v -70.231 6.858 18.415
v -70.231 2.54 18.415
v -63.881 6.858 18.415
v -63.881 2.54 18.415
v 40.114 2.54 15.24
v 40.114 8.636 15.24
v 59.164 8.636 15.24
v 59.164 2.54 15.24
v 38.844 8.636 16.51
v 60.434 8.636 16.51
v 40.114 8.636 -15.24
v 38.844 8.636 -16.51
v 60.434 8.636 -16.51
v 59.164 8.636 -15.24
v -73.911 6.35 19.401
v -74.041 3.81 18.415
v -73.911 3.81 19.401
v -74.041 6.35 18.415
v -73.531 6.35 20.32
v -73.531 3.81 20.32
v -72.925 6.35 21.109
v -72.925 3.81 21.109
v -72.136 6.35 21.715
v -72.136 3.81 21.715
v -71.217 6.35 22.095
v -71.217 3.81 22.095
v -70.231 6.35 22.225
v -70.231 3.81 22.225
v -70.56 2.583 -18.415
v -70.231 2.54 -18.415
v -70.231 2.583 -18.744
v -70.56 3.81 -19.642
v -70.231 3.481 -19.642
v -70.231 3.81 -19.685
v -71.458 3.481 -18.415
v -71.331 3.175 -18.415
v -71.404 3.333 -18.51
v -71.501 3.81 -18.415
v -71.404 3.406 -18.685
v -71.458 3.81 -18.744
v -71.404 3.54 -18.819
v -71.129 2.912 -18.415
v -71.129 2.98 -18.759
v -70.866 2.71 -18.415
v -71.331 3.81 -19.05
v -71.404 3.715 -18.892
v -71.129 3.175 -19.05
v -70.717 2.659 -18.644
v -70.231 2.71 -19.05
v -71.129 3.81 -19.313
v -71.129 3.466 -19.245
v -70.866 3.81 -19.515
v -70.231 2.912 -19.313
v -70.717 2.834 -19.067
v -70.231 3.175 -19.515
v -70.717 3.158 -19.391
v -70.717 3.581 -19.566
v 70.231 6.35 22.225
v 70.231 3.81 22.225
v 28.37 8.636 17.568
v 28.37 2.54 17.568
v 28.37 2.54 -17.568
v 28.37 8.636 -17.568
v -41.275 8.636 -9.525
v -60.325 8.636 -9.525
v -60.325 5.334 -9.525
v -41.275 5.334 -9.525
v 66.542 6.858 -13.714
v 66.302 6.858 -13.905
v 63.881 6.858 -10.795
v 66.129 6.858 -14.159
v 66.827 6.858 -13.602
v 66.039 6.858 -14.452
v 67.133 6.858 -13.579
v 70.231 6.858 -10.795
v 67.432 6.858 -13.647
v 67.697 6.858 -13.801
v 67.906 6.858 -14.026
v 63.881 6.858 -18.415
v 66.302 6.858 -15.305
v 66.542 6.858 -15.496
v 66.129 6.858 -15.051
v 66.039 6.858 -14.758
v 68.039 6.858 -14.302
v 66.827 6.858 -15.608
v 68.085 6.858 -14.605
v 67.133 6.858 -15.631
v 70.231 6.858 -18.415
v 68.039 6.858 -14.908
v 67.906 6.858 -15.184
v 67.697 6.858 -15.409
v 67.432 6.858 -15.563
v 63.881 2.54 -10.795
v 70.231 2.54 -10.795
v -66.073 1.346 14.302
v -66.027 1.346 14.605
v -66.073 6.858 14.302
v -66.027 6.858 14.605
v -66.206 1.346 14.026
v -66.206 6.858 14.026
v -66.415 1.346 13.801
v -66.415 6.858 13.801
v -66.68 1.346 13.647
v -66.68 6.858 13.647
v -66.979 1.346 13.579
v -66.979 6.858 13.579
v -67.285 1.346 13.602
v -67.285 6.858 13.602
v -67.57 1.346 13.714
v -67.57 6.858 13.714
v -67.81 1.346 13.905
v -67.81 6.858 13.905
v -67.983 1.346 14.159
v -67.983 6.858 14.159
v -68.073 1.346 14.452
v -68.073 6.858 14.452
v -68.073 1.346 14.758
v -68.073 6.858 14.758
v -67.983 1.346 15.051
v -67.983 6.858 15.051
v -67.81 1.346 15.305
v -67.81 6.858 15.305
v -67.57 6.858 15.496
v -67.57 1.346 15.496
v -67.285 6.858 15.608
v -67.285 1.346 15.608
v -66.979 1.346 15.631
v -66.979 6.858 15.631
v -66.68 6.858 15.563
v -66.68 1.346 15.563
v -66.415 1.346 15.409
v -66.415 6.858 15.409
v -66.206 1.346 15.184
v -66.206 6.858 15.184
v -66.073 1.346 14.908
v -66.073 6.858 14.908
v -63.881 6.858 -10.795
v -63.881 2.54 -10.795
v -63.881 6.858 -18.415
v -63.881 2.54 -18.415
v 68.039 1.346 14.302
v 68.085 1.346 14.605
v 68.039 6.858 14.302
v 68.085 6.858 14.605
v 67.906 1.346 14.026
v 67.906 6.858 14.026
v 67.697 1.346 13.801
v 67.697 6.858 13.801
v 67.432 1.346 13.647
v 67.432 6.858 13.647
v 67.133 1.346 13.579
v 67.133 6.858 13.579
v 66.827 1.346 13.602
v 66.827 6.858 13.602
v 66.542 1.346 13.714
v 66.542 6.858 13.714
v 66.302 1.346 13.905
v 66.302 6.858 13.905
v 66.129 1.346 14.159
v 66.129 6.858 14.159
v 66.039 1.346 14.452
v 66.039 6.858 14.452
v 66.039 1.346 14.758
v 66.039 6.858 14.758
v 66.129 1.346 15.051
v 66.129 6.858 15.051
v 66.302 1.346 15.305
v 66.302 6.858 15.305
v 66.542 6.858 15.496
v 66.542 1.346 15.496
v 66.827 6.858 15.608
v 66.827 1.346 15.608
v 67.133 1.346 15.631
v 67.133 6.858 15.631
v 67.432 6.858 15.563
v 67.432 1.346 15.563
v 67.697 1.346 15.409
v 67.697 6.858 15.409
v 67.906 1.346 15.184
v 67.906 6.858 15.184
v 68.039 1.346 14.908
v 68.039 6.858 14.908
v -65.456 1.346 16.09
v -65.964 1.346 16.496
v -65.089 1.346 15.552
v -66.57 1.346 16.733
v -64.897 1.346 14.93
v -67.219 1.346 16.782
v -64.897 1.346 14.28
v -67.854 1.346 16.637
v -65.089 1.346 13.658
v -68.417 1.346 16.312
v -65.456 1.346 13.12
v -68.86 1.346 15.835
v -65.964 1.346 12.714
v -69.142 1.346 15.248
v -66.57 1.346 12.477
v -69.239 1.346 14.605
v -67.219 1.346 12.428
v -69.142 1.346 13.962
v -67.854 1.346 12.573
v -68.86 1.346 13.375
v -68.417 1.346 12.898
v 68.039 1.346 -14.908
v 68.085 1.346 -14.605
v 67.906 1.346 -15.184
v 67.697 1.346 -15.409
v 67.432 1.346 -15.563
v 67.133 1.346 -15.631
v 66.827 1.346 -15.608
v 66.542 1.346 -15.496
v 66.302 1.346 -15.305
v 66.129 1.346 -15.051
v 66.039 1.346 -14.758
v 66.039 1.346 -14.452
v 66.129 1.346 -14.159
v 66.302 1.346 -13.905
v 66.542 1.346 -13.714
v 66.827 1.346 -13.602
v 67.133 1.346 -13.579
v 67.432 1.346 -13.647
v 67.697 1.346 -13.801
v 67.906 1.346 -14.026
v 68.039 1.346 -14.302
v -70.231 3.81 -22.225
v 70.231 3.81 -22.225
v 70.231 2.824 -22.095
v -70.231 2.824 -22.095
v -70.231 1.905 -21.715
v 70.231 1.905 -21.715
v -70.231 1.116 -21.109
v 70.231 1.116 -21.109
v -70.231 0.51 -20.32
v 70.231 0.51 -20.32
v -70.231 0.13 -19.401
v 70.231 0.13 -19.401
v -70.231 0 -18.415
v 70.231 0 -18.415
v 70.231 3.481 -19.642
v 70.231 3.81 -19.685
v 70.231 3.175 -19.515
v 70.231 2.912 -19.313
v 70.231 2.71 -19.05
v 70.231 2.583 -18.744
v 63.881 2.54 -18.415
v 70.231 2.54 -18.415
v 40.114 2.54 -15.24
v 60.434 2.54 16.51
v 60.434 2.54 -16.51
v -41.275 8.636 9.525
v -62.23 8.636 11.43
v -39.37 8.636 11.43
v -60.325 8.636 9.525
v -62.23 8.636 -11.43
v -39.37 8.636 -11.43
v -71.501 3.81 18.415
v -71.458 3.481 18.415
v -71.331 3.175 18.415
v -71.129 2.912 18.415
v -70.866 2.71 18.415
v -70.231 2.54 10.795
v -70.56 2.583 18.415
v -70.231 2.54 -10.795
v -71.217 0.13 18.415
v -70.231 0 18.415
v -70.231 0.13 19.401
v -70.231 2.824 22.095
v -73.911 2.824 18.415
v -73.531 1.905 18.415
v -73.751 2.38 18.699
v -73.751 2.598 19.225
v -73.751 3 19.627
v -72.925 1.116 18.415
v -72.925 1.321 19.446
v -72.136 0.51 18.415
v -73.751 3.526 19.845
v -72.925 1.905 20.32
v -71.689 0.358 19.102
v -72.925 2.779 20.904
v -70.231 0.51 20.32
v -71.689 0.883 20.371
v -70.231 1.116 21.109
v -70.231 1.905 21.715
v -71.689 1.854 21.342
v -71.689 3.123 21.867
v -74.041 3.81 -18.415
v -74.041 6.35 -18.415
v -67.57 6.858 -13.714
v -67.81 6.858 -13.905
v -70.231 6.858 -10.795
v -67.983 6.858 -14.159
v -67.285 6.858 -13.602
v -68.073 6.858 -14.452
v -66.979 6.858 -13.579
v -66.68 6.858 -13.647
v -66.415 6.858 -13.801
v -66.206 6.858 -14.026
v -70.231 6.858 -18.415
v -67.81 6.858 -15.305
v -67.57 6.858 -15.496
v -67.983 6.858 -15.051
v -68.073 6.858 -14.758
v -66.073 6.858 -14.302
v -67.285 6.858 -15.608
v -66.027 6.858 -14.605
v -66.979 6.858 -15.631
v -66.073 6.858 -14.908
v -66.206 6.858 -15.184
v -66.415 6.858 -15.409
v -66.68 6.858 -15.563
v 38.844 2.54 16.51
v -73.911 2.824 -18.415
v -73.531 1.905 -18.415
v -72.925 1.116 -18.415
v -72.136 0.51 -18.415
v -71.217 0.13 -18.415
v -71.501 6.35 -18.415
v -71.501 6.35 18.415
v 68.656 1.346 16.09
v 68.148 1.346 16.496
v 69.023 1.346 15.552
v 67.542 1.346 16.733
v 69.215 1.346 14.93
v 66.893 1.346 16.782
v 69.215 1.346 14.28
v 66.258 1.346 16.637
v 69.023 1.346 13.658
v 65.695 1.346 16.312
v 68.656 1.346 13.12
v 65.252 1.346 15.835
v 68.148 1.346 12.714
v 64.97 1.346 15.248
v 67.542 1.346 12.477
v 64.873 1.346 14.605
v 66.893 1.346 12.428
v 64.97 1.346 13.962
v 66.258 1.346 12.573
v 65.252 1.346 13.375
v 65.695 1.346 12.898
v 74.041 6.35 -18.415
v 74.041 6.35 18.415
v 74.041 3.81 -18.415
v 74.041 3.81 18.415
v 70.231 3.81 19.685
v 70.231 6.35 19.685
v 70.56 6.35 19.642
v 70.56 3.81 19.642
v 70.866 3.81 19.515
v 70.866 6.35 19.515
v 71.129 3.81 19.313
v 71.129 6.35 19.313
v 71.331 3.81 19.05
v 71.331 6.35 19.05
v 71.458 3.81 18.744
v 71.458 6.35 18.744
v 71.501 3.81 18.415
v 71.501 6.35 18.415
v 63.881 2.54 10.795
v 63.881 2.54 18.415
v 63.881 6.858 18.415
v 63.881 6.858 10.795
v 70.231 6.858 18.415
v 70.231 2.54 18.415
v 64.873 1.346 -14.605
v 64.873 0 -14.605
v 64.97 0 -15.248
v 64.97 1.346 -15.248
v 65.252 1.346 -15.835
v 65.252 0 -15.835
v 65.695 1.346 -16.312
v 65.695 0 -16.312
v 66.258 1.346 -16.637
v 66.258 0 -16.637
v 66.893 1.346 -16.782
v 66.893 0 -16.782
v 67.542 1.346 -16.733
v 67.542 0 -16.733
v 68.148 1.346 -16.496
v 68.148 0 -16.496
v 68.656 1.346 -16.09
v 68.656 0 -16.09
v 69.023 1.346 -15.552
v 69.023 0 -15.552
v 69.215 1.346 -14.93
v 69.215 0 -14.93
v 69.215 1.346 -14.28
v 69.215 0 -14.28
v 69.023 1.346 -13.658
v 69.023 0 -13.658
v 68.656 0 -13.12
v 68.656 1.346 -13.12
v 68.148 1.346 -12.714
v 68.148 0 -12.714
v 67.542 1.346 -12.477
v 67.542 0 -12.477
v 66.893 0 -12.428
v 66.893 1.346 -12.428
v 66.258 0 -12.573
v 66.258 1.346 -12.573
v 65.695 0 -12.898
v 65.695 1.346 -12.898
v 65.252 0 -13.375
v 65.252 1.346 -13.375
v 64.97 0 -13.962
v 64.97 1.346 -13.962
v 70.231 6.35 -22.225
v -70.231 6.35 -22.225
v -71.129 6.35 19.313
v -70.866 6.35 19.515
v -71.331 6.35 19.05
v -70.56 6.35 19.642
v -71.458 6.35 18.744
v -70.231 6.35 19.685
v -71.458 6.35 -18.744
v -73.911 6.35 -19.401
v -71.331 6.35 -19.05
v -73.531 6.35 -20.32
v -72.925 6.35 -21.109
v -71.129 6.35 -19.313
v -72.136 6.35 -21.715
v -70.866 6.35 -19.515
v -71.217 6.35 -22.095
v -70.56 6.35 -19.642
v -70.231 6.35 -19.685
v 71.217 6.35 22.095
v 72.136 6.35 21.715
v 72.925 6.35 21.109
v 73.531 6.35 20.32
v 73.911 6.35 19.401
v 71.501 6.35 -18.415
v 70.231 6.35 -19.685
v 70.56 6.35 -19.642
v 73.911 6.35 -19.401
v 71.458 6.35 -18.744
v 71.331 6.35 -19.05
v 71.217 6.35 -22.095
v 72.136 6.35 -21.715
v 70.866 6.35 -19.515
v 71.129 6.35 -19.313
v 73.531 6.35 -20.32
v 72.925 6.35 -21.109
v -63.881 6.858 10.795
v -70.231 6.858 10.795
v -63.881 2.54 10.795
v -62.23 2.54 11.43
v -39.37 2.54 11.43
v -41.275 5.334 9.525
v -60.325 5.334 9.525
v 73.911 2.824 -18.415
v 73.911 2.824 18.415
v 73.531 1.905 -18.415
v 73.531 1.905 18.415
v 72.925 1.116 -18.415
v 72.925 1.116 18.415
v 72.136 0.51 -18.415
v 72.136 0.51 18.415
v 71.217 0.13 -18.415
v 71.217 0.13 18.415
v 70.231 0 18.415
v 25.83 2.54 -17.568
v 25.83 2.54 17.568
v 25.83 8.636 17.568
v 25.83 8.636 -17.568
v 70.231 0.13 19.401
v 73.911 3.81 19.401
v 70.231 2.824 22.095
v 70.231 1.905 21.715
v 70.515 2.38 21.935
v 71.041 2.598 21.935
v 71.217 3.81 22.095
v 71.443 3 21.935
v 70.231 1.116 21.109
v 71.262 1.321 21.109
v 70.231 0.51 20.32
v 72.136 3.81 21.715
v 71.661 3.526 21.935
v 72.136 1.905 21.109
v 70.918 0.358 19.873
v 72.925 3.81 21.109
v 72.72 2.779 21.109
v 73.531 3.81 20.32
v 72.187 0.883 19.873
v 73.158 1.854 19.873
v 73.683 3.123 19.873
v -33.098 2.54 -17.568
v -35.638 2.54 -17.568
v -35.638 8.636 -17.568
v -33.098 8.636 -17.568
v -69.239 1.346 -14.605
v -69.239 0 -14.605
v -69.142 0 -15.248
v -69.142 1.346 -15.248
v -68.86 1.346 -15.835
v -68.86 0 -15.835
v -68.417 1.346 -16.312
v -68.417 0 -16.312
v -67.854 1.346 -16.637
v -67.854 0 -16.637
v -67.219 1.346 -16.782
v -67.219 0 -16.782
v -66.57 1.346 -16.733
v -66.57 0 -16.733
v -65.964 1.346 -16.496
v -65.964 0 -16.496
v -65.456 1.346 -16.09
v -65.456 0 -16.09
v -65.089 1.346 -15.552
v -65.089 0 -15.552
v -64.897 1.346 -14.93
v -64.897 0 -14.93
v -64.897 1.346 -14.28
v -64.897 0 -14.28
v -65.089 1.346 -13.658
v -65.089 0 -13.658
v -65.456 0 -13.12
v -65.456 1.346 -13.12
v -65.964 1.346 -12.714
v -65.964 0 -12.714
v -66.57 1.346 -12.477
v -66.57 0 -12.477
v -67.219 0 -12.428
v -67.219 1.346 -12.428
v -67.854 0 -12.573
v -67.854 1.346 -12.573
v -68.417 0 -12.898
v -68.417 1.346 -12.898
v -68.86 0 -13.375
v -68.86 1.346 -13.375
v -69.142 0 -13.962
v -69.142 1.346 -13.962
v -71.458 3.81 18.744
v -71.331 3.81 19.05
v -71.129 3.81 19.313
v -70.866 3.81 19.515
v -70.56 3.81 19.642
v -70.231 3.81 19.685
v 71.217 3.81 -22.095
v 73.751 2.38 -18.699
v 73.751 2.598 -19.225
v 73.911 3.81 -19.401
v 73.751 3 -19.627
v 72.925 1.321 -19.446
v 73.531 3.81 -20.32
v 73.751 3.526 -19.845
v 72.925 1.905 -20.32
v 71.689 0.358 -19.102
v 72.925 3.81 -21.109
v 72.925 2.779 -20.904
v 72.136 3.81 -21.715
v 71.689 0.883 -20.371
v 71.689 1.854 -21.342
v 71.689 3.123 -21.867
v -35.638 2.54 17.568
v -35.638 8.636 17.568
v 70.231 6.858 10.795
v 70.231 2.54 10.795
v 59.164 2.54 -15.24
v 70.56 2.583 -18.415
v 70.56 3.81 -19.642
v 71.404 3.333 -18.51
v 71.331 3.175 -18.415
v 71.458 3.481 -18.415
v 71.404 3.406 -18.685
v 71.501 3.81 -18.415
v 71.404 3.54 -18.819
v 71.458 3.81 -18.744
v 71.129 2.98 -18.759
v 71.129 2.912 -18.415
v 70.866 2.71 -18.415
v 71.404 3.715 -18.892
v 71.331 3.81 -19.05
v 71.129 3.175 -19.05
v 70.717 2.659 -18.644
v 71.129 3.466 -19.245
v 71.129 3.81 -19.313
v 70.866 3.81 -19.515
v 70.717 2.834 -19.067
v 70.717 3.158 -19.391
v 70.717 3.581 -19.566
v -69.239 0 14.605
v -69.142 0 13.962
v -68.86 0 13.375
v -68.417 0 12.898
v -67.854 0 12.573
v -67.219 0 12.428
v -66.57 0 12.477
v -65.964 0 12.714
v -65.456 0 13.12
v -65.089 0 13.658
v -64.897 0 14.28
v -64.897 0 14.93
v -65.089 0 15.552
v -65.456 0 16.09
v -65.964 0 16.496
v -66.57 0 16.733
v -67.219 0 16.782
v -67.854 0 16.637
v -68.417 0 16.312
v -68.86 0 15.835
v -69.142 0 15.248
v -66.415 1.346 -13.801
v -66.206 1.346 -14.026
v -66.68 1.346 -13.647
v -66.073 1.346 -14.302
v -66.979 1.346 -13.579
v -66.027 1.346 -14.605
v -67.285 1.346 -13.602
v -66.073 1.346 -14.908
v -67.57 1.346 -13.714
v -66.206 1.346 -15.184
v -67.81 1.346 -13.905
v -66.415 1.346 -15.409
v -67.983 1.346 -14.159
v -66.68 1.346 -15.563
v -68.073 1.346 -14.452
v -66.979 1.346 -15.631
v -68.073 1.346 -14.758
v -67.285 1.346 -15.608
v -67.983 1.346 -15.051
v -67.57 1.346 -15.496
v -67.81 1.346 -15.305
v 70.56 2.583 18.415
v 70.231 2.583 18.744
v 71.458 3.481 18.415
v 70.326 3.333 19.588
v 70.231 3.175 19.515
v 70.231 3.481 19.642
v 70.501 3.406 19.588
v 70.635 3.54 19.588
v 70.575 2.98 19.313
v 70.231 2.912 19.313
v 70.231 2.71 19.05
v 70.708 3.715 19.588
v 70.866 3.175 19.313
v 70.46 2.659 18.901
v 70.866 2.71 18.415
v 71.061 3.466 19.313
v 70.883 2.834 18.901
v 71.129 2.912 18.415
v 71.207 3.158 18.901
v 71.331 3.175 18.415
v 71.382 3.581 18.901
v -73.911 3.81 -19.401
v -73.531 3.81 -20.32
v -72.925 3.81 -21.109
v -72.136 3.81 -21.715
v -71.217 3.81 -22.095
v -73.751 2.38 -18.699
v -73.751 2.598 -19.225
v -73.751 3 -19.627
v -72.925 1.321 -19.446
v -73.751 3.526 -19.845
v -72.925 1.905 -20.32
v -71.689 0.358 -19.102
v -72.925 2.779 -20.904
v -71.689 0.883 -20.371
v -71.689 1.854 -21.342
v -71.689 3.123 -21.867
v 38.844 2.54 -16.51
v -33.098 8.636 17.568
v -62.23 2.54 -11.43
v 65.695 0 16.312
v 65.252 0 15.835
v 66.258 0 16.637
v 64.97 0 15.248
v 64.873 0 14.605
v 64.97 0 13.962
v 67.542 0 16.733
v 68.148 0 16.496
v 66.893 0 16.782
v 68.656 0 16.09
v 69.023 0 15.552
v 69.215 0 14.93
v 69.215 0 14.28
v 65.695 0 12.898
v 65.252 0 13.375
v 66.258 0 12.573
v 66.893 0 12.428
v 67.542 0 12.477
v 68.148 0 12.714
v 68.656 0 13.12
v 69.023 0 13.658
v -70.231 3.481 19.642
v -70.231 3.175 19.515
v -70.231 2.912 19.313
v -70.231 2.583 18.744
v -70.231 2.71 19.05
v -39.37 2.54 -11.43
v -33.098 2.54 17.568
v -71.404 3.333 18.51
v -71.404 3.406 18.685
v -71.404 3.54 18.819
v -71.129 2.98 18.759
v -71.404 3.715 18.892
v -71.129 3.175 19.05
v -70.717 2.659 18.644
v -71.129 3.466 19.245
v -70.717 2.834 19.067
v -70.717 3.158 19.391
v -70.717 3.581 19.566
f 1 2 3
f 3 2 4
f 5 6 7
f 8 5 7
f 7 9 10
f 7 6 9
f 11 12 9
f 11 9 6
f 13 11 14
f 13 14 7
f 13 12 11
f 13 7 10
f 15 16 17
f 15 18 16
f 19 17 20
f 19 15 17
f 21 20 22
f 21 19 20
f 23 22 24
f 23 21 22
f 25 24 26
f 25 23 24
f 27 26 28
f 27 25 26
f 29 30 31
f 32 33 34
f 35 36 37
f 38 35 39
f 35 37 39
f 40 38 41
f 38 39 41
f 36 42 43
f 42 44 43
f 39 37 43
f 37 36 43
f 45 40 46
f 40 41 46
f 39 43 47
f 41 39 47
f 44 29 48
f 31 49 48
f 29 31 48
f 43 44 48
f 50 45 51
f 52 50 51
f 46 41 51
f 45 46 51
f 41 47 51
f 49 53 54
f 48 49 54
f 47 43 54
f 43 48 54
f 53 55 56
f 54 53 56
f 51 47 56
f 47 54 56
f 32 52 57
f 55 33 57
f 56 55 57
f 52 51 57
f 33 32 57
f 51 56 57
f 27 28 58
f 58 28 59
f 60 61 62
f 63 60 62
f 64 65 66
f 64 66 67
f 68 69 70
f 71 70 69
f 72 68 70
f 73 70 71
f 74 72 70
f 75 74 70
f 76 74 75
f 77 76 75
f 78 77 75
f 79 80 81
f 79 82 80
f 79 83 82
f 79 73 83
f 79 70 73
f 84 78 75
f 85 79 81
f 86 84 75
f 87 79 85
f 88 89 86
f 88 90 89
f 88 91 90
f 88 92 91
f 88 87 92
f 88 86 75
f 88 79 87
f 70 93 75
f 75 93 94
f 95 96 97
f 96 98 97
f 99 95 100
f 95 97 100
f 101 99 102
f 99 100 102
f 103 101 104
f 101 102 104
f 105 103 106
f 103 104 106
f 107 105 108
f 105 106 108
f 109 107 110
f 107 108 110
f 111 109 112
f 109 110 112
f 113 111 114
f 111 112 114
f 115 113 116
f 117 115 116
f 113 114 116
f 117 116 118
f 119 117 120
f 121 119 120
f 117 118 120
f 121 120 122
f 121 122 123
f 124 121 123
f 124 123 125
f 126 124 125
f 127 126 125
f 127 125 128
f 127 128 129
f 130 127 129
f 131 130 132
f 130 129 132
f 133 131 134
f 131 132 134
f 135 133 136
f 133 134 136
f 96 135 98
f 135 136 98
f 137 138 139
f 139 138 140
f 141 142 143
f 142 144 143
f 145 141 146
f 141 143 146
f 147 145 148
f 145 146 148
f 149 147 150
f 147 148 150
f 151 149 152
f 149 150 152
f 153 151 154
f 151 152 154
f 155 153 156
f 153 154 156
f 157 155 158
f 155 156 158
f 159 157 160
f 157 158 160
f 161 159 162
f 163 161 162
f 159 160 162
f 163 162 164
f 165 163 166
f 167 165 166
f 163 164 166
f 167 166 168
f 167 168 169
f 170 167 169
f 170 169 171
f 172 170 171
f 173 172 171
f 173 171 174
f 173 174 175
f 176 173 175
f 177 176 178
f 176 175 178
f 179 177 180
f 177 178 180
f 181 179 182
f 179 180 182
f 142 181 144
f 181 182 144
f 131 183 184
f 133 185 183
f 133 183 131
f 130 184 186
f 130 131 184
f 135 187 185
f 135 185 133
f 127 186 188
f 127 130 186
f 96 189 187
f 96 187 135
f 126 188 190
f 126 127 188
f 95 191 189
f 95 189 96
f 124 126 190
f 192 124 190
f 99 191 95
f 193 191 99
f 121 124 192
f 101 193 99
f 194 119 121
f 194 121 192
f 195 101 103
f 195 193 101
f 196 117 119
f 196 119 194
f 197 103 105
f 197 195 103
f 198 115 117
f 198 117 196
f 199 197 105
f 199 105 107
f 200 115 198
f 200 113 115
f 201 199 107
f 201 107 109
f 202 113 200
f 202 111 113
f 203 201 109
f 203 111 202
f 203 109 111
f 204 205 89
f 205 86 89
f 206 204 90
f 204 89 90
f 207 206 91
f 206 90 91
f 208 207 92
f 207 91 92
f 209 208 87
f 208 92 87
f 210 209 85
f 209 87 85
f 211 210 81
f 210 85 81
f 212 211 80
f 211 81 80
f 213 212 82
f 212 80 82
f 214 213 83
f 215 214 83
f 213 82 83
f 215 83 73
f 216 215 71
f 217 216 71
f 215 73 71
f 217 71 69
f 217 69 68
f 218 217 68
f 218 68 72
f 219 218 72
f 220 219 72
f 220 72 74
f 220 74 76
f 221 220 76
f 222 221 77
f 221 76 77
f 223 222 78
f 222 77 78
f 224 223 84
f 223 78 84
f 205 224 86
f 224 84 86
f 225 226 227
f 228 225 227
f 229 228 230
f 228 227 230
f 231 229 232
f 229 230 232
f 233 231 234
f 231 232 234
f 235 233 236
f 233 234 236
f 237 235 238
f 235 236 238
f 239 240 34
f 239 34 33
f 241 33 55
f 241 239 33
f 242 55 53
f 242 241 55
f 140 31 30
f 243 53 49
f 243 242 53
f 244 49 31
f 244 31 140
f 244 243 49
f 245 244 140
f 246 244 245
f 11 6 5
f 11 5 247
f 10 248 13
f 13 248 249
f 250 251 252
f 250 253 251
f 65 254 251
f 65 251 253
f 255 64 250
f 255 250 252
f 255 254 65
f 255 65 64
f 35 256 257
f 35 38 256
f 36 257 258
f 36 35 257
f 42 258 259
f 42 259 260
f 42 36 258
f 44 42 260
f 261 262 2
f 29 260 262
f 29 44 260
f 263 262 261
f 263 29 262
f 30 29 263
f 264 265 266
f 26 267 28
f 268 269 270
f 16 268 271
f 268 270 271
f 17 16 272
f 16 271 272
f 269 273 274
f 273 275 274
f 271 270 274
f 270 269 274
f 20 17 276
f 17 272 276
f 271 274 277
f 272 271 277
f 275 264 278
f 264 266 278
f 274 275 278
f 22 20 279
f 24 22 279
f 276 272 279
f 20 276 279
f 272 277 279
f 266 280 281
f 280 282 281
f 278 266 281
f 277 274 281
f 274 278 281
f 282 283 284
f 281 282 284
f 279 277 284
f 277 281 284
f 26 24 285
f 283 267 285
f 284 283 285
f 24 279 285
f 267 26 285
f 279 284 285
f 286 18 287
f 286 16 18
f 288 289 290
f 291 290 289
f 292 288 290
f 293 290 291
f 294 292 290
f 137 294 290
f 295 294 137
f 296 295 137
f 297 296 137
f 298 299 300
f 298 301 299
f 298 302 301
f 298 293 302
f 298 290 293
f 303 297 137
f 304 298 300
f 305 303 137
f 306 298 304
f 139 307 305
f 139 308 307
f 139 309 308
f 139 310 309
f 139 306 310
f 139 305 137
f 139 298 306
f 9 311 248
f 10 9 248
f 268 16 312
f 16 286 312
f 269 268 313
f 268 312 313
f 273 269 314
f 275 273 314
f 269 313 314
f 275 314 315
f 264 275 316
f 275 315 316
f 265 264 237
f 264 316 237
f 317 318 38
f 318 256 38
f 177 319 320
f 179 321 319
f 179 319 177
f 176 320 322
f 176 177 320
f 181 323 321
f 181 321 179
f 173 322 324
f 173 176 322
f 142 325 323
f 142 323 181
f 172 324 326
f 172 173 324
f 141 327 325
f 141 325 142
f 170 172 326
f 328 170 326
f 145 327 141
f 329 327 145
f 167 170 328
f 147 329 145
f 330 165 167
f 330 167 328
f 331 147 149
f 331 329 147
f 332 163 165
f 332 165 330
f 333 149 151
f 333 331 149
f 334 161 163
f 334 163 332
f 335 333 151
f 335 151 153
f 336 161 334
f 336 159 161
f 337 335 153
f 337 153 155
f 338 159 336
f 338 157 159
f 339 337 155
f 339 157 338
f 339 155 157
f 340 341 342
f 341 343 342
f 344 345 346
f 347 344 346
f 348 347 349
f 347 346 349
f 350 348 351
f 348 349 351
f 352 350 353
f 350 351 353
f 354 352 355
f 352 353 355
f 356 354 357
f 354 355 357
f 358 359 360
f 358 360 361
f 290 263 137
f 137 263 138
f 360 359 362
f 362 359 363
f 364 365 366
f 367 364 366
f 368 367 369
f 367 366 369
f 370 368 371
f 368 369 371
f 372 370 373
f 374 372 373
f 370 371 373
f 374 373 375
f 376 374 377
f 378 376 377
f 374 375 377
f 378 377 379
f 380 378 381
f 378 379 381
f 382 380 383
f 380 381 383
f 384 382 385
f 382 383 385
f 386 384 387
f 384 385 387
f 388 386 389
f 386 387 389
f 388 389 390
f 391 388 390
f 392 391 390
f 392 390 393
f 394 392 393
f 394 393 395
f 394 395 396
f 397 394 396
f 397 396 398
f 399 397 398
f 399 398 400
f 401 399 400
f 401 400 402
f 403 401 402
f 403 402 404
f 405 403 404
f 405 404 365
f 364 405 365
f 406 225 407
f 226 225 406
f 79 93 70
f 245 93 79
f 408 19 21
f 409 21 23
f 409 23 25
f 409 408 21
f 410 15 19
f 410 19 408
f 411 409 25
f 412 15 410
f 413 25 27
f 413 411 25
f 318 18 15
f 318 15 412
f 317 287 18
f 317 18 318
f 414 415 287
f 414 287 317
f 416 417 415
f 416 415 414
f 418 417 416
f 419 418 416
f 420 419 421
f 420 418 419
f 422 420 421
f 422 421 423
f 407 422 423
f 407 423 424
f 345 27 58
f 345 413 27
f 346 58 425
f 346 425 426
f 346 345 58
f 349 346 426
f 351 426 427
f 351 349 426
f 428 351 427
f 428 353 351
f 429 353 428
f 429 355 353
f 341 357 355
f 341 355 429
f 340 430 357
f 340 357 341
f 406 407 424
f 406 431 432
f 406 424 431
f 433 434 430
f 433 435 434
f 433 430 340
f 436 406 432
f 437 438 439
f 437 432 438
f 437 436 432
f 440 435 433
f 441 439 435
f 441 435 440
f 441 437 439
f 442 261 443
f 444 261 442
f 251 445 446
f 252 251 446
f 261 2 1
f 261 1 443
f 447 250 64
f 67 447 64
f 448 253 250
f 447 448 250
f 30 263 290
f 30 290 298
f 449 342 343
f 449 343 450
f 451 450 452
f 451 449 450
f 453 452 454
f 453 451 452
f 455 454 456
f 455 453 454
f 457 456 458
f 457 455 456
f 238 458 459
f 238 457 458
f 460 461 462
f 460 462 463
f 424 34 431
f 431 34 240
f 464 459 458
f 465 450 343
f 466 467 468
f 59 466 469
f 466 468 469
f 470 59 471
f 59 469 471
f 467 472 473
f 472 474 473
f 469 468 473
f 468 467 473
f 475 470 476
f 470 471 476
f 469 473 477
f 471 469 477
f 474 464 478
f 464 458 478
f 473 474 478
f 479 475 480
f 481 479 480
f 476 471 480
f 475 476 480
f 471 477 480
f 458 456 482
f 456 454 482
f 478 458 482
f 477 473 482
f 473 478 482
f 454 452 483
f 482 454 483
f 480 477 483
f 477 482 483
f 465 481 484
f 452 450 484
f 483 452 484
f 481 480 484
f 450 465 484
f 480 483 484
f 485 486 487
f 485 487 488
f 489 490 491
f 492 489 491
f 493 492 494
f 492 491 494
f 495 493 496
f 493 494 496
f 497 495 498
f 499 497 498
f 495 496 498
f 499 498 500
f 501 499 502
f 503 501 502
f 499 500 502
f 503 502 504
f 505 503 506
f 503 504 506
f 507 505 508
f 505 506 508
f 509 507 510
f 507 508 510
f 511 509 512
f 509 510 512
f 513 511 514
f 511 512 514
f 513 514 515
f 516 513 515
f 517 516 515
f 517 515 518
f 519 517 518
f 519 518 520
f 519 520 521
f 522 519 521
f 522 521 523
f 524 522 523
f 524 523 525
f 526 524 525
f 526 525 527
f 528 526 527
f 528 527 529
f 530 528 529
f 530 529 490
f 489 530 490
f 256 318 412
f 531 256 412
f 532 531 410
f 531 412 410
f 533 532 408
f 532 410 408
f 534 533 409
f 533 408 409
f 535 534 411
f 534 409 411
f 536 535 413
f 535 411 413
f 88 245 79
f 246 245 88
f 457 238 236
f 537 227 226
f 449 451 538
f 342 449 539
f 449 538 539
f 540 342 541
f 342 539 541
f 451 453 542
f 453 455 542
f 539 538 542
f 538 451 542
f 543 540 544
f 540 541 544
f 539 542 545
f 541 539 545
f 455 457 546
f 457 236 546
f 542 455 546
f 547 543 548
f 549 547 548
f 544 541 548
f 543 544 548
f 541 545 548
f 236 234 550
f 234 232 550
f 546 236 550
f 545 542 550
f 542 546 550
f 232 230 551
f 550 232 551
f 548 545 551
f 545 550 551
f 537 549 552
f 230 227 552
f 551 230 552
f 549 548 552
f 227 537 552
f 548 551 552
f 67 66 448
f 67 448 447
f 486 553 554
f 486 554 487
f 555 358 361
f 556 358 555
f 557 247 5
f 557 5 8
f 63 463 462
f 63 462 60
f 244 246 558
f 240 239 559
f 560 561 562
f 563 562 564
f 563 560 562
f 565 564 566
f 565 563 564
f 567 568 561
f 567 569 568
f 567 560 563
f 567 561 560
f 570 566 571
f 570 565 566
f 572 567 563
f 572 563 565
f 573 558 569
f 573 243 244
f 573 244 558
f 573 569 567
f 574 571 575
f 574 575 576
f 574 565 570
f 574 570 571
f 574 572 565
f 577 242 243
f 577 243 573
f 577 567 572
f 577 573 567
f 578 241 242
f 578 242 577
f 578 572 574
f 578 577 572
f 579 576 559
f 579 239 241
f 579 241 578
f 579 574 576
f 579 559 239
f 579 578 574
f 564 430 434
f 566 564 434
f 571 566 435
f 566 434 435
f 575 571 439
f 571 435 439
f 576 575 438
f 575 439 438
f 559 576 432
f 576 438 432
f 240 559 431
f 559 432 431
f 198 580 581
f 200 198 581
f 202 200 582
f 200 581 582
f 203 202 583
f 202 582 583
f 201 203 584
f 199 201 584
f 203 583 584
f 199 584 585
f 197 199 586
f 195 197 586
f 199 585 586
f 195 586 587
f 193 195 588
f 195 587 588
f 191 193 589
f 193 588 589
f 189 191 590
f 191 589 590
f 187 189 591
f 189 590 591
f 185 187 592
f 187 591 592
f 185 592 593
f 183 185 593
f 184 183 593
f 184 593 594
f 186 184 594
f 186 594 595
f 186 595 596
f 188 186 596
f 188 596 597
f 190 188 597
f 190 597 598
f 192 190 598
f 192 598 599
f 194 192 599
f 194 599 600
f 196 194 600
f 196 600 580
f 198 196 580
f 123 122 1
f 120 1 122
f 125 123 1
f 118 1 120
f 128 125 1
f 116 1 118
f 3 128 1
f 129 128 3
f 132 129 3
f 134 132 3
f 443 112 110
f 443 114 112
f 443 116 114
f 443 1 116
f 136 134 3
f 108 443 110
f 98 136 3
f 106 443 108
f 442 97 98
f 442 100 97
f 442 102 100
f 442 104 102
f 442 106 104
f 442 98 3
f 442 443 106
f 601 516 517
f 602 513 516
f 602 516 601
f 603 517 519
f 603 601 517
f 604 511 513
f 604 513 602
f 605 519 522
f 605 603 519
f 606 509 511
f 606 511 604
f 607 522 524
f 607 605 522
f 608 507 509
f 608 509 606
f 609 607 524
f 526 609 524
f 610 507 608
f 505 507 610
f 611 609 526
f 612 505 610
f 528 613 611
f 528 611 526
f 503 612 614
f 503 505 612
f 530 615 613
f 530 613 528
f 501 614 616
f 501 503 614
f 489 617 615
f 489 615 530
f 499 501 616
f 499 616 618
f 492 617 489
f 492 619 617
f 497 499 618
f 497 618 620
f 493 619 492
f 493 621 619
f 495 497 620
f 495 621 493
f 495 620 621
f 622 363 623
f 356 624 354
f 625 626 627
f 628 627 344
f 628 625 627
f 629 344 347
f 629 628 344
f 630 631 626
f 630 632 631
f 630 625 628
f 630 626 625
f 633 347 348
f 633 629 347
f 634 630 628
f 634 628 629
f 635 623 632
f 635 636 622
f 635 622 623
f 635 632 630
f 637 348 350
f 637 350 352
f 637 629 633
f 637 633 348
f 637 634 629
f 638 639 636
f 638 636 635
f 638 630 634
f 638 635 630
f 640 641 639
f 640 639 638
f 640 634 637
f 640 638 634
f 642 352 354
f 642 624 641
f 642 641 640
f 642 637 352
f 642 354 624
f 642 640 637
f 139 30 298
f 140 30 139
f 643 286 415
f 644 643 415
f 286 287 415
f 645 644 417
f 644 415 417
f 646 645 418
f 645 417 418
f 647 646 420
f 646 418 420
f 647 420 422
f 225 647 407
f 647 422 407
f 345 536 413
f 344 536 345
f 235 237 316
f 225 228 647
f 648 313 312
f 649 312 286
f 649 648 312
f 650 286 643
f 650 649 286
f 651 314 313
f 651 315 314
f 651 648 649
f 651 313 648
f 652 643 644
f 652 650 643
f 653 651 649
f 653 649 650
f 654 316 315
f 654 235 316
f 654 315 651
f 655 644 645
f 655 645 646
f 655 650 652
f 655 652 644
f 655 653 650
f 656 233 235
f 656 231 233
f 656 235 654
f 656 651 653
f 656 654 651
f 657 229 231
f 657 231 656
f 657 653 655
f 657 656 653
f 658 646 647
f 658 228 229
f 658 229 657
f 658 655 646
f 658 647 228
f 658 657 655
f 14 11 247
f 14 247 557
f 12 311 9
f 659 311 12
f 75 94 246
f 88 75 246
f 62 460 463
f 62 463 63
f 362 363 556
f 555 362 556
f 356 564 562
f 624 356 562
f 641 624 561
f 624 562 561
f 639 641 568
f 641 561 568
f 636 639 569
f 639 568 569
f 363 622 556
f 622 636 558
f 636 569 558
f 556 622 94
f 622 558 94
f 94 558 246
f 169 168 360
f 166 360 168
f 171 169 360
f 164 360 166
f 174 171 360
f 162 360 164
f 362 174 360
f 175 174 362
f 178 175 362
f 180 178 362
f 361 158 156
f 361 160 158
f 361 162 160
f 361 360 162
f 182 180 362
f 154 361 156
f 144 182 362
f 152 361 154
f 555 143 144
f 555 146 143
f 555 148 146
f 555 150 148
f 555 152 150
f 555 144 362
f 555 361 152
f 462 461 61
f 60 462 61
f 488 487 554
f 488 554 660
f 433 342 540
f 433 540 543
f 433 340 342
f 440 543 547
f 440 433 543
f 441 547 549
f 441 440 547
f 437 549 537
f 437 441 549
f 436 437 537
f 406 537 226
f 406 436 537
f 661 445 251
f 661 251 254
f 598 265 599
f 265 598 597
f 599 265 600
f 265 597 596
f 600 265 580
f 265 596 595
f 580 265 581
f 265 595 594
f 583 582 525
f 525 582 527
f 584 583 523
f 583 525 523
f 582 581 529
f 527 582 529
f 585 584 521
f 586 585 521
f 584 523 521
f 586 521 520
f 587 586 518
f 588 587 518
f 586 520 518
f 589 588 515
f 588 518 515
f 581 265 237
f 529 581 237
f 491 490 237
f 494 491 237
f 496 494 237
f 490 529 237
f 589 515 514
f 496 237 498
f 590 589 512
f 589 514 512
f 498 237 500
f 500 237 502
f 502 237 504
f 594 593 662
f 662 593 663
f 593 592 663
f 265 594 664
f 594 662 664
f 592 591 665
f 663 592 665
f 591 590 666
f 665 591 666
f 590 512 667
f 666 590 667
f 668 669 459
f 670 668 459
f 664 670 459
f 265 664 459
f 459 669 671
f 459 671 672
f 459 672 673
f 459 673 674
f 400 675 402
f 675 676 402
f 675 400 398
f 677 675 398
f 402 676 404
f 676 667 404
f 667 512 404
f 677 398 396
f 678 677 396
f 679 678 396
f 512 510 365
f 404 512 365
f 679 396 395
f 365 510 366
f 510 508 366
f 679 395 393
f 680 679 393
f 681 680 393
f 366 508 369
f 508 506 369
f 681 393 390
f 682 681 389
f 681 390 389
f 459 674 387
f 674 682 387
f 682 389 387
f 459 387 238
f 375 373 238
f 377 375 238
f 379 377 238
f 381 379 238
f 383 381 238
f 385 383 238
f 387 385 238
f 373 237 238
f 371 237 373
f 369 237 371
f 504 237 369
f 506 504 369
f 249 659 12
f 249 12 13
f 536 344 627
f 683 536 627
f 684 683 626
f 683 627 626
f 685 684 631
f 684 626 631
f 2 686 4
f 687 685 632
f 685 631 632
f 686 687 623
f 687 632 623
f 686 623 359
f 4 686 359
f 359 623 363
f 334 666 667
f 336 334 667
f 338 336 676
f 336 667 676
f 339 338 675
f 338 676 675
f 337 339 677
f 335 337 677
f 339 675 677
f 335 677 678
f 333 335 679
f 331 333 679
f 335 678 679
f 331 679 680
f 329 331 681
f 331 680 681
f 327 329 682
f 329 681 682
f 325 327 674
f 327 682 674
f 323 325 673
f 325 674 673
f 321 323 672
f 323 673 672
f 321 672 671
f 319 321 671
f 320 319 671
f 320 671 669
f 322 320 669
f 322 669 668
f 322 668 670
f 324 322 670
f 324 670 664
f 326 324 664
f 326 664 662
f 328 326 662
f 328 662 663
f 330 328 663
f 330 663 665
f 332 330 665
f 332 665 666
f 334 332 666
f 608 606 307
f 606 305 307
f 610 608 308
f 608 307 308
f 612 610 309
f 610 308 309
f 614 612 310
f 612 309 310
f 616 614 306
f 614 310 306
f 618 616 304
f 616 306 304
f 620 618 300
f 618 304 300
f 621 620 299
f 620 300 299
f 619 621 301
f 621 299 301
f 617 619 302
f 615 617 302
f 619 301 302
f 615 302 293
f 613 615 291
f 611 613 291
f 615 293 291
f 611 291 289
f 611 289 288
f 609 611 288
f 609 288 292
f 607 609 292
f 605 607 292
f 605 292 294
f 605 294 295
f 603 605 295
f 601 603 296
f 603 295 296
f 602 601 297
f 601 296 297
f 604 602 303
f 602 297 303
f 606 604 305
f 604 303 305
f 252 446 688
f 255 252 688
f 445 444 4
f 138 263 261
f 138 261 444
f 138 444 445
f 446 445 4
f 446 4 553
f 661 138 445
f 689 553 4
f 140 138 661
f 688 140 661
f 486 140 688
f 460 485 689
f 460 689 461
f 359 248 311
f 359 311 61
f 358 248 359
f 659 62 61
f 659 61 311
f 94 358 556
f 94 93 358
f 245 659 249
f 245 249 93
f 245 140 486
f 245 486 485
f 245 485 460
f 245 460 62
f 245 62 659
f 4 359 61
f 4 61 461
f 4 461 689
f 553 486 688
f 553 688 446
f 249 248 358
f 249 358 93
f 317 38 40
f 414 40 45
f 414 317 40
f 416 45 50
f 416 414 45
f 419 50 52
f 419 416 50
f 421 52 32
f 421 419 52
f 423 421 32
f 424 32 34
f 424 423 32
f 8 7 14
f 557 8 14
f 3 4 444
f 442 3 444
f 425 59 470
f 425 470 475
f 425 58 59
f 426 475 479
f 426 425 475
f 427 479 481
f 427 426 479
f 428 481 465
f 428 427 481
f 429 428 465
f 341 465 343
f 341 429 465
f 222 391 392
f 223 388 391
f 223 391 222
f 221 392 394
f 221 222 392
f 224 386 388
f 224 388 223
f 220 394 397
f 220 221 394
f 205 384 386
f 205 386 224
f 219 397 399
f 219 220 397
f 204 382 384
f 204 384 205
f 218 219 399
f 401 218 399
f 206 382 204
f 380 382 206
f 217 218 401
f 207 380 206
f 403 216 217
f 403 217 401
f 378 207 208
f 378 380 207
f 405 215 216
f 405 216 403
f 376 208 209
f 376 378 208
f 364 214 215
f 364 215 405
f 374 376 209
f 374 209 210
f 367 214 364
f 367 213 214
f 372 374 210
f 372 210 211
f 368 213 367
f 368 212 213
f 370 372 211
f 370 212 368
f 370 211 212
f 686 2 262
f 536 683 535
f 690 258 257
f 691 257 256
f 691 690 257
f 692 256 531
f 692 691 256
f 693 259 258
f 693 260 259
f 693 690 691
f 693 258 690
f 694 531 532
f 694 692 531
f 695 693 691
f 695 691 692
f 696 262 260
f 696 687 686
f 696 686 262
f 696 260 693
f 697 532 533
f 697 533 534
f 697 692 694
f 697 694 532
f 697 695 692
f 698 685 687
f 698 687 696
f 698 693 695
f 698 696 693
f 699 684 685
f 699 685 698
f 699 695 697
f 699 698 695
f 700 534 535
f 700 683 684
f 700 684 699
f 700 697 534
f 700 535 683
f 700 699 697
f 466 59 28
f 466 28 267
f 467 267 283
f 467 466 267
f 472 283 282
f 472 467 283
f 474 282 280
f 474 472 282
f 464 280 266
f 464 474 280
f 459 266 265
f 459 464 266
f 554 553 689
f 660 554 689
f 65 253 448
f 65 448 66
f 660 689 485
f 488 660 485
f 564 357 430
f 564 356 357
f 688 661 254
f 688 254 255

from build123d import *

# Parameters (mm, degrees)
SKETCH1_W                                       = 148.082
SKETCH1_H                                       = 44.45
BOSS_EXTRUDE1_DEPTH                             = 6.35
FILLET1_R                                       = 3.81
SHELL1_T                                        = -2.54
SKETCH3_W                                       = 6.35
SKETCH3_H                                       = 7.62
BOSS_EXTRUDE2_DEPTH                             = 4.318
SKETCH5_W                                       = 22.86
SKETCH5_H                                       = 22.86
BOSS_EXTRUDE3_DEPTH                             = 6.096
SKETCH7_W                                       = 19.05
SKETCH7_H                                       = 19.05
CUT_EXTRUDE1_DEPTH                              = 3.302
SKETCH8_W                                       = 21.59
SKETCH8_H                                       = 33.02
BOSS_EXTRUDE4_DEPTH                             = 6.096
SKETCH9_W                                       = 2.54
SKETCH9_H                                       = 35.135780098
BOSS_EXTRUDE5_DEPTH                             = 6.096
SKETCH12_W                                      = 19.05
SKETCH12_H                                      = 30.48
CUT_EXTRUDE2_DEPTH                              = 6.096
CBORE_FOR_1_PAN_HEAD_MACHINE_SCREW3_D           = 2.0574
CBORE_FOR_1_PAN_HEAD_MACHINE_SCREW3_CBORE_D     = 4.36626
CBORE_FOR_1_PAN_HEAD_MACHINE_SCREW3_CBORE_DEPTH = 1.3462


with BuildPart() as part:
    # Sketch1 → Boss-Extrude1 (new body)
    with BuildSketch(Plane(origin=(0, 0, 0), x_dir=(1, 0, 0), z_dir=(0, 1, 0))):
        Rectangle(SKETCH1_W, SKETCH1_H)
    extrude(amount=BOSS_EXTRUDE1_DEPTH)

    # Fillet1
    fillet1_edges = [part.edges().sort_by_distance(p)[0] for p in [
        (0, 0, -22.225),
        (74.041, 0, 0),
        (0, 0, 22.225),
        (-74.041, 0, 0),
        (-74.041, 3.175, -22.225),
        (74.041, 3.175, -22.225),
        (74.041, 3.175, 22.225),
        (-74.041, 3.175, 22.225),
    ]]
    fillet(fillet1_edges, radius=FILLET1_R)

    # Shell1
    shell1_openings = [part.faces().sort_by_distance(p)[0] for p in [
        (0, 6.35, 0),
    ]]
    offset(amount=SHELL1_T, openings=shell1_openings, kind=Kind.INTERSECTION)

    # Sketch3 → Boss-Extrude2 (add)
    with BuildSketch(Plane(origin=(0, 2.54, 0), x_dir=(1, 0, 0), z_dir=(0, 1, 0))):
        with Locations((-67.056, 14.605)):
            Rectangle(SKETCH3_W, SKETCH3_H)
        with Locations((67.056, 14.605)):
            Rectangle(SKETCH3_W, SKETCH3_H)
        with Locations((-67.056, -14.605)):
            Rectangle(SKETCH3_W, SKETCH3_H)
        with Locations((67.056, -14.605)):
            Rectangle(SKETCH3_W, SKETCH3_H)
    extrude(amount=BOSS_EXTRUDE2_DEPTH)

    # Sketch5 → Boss-Extrude3 (add)
    with BuildSketch(Plane(origin=(0, 2.54, 0), x_dir=(1, 0, 0), z_dir=(0, 1, 0))):
        with Locations((-50.8, 0)):
            Rectangle(SKETCH5_W, SKETCH5_H)
    extrude(amount=BOSS_EXTRUDE3_DEPTH)

    # Sketch7 → Cut-Extrude1 (cut)
    with BuildSketch(Plane(origin=(0, 8.636, 0), x_dir=(1, 0, 0), z_dir=(0, 1, 0))):
        with Locations((-50.8, 0)):
            Rectangle(SKETCH7_W, SKETCH7_H)
    extrude(amount=-CUT_EXTRUDE1_DEPTH, mode=Mode.SUBTRACT)

    # Sketch8 → Boss-Extrude4 (add)
    with BuildSketch(Plane(origin=(0, 2.54, 0), x_dir=(1, 0, 0), z_dir=(0, 1, 0))):
        with Locations((49.639483249, 0)):
            Rectangle(SKETCH8_W, SKETCH8_H)
    extrude(amount=BOSS_EXTRUDE4_DEPTH)

    # Sketch9 → Boss-Extrude5 (add)
    with BuildSketch(Plane(origin=(0, 2.54, 0), x_dir=(1, 0, 0), z_dir=(0, 1, 0))):
        with Locations((-34.367719814, 0)):
            Rectangle(SKETCH9_W, SKETCH9_H)
        with Locations((27.100280186, 0)):
            Rectangle(SKETCH9_W, SKETCH9_H)
    extrude(amount=BOSS_EXTRUDE5_DEPTH)

    # Sketch12 → Cut-Extrude2 (cut)
    with BuildSketch(Plane(origin=(0, 8.636, 0), x_dir=(1, 0, 0), z_dir=(0, 1, 0))):
        with Locations((49.639483249, 0)):
            Rectangle(SKETCH12_W, SKETCH12_H)
    extrude(amount=-CUT_EXTRUDE2_DEPTH, mode=Mode.SUBTRACT)

    # CBORE for #1 Pan Head Machine Screw3 (through all)
    with Locations(Plane(origin=(0, 0, 0), x_dir=(-1, 0, 0), z_dir=(0, -1, 0))):
        with Locations((-67.056, 14.605), (-67.056, -14.605), (67.056, -14.605), (67.056, 14.605)):
            CounterBoreHole(CBORE_FOR_1_PAN_HEAD_MACHINE_SCREW3_D / 2, CBORE_FOR_1_PAN_HEAD_MACHINE_SCREW3_CBORE_D / 2, CBORE_FOR_1_PAN_HEAD_MACHINE_SCREW3_CBORE_DEPTH)


solid = part.part
